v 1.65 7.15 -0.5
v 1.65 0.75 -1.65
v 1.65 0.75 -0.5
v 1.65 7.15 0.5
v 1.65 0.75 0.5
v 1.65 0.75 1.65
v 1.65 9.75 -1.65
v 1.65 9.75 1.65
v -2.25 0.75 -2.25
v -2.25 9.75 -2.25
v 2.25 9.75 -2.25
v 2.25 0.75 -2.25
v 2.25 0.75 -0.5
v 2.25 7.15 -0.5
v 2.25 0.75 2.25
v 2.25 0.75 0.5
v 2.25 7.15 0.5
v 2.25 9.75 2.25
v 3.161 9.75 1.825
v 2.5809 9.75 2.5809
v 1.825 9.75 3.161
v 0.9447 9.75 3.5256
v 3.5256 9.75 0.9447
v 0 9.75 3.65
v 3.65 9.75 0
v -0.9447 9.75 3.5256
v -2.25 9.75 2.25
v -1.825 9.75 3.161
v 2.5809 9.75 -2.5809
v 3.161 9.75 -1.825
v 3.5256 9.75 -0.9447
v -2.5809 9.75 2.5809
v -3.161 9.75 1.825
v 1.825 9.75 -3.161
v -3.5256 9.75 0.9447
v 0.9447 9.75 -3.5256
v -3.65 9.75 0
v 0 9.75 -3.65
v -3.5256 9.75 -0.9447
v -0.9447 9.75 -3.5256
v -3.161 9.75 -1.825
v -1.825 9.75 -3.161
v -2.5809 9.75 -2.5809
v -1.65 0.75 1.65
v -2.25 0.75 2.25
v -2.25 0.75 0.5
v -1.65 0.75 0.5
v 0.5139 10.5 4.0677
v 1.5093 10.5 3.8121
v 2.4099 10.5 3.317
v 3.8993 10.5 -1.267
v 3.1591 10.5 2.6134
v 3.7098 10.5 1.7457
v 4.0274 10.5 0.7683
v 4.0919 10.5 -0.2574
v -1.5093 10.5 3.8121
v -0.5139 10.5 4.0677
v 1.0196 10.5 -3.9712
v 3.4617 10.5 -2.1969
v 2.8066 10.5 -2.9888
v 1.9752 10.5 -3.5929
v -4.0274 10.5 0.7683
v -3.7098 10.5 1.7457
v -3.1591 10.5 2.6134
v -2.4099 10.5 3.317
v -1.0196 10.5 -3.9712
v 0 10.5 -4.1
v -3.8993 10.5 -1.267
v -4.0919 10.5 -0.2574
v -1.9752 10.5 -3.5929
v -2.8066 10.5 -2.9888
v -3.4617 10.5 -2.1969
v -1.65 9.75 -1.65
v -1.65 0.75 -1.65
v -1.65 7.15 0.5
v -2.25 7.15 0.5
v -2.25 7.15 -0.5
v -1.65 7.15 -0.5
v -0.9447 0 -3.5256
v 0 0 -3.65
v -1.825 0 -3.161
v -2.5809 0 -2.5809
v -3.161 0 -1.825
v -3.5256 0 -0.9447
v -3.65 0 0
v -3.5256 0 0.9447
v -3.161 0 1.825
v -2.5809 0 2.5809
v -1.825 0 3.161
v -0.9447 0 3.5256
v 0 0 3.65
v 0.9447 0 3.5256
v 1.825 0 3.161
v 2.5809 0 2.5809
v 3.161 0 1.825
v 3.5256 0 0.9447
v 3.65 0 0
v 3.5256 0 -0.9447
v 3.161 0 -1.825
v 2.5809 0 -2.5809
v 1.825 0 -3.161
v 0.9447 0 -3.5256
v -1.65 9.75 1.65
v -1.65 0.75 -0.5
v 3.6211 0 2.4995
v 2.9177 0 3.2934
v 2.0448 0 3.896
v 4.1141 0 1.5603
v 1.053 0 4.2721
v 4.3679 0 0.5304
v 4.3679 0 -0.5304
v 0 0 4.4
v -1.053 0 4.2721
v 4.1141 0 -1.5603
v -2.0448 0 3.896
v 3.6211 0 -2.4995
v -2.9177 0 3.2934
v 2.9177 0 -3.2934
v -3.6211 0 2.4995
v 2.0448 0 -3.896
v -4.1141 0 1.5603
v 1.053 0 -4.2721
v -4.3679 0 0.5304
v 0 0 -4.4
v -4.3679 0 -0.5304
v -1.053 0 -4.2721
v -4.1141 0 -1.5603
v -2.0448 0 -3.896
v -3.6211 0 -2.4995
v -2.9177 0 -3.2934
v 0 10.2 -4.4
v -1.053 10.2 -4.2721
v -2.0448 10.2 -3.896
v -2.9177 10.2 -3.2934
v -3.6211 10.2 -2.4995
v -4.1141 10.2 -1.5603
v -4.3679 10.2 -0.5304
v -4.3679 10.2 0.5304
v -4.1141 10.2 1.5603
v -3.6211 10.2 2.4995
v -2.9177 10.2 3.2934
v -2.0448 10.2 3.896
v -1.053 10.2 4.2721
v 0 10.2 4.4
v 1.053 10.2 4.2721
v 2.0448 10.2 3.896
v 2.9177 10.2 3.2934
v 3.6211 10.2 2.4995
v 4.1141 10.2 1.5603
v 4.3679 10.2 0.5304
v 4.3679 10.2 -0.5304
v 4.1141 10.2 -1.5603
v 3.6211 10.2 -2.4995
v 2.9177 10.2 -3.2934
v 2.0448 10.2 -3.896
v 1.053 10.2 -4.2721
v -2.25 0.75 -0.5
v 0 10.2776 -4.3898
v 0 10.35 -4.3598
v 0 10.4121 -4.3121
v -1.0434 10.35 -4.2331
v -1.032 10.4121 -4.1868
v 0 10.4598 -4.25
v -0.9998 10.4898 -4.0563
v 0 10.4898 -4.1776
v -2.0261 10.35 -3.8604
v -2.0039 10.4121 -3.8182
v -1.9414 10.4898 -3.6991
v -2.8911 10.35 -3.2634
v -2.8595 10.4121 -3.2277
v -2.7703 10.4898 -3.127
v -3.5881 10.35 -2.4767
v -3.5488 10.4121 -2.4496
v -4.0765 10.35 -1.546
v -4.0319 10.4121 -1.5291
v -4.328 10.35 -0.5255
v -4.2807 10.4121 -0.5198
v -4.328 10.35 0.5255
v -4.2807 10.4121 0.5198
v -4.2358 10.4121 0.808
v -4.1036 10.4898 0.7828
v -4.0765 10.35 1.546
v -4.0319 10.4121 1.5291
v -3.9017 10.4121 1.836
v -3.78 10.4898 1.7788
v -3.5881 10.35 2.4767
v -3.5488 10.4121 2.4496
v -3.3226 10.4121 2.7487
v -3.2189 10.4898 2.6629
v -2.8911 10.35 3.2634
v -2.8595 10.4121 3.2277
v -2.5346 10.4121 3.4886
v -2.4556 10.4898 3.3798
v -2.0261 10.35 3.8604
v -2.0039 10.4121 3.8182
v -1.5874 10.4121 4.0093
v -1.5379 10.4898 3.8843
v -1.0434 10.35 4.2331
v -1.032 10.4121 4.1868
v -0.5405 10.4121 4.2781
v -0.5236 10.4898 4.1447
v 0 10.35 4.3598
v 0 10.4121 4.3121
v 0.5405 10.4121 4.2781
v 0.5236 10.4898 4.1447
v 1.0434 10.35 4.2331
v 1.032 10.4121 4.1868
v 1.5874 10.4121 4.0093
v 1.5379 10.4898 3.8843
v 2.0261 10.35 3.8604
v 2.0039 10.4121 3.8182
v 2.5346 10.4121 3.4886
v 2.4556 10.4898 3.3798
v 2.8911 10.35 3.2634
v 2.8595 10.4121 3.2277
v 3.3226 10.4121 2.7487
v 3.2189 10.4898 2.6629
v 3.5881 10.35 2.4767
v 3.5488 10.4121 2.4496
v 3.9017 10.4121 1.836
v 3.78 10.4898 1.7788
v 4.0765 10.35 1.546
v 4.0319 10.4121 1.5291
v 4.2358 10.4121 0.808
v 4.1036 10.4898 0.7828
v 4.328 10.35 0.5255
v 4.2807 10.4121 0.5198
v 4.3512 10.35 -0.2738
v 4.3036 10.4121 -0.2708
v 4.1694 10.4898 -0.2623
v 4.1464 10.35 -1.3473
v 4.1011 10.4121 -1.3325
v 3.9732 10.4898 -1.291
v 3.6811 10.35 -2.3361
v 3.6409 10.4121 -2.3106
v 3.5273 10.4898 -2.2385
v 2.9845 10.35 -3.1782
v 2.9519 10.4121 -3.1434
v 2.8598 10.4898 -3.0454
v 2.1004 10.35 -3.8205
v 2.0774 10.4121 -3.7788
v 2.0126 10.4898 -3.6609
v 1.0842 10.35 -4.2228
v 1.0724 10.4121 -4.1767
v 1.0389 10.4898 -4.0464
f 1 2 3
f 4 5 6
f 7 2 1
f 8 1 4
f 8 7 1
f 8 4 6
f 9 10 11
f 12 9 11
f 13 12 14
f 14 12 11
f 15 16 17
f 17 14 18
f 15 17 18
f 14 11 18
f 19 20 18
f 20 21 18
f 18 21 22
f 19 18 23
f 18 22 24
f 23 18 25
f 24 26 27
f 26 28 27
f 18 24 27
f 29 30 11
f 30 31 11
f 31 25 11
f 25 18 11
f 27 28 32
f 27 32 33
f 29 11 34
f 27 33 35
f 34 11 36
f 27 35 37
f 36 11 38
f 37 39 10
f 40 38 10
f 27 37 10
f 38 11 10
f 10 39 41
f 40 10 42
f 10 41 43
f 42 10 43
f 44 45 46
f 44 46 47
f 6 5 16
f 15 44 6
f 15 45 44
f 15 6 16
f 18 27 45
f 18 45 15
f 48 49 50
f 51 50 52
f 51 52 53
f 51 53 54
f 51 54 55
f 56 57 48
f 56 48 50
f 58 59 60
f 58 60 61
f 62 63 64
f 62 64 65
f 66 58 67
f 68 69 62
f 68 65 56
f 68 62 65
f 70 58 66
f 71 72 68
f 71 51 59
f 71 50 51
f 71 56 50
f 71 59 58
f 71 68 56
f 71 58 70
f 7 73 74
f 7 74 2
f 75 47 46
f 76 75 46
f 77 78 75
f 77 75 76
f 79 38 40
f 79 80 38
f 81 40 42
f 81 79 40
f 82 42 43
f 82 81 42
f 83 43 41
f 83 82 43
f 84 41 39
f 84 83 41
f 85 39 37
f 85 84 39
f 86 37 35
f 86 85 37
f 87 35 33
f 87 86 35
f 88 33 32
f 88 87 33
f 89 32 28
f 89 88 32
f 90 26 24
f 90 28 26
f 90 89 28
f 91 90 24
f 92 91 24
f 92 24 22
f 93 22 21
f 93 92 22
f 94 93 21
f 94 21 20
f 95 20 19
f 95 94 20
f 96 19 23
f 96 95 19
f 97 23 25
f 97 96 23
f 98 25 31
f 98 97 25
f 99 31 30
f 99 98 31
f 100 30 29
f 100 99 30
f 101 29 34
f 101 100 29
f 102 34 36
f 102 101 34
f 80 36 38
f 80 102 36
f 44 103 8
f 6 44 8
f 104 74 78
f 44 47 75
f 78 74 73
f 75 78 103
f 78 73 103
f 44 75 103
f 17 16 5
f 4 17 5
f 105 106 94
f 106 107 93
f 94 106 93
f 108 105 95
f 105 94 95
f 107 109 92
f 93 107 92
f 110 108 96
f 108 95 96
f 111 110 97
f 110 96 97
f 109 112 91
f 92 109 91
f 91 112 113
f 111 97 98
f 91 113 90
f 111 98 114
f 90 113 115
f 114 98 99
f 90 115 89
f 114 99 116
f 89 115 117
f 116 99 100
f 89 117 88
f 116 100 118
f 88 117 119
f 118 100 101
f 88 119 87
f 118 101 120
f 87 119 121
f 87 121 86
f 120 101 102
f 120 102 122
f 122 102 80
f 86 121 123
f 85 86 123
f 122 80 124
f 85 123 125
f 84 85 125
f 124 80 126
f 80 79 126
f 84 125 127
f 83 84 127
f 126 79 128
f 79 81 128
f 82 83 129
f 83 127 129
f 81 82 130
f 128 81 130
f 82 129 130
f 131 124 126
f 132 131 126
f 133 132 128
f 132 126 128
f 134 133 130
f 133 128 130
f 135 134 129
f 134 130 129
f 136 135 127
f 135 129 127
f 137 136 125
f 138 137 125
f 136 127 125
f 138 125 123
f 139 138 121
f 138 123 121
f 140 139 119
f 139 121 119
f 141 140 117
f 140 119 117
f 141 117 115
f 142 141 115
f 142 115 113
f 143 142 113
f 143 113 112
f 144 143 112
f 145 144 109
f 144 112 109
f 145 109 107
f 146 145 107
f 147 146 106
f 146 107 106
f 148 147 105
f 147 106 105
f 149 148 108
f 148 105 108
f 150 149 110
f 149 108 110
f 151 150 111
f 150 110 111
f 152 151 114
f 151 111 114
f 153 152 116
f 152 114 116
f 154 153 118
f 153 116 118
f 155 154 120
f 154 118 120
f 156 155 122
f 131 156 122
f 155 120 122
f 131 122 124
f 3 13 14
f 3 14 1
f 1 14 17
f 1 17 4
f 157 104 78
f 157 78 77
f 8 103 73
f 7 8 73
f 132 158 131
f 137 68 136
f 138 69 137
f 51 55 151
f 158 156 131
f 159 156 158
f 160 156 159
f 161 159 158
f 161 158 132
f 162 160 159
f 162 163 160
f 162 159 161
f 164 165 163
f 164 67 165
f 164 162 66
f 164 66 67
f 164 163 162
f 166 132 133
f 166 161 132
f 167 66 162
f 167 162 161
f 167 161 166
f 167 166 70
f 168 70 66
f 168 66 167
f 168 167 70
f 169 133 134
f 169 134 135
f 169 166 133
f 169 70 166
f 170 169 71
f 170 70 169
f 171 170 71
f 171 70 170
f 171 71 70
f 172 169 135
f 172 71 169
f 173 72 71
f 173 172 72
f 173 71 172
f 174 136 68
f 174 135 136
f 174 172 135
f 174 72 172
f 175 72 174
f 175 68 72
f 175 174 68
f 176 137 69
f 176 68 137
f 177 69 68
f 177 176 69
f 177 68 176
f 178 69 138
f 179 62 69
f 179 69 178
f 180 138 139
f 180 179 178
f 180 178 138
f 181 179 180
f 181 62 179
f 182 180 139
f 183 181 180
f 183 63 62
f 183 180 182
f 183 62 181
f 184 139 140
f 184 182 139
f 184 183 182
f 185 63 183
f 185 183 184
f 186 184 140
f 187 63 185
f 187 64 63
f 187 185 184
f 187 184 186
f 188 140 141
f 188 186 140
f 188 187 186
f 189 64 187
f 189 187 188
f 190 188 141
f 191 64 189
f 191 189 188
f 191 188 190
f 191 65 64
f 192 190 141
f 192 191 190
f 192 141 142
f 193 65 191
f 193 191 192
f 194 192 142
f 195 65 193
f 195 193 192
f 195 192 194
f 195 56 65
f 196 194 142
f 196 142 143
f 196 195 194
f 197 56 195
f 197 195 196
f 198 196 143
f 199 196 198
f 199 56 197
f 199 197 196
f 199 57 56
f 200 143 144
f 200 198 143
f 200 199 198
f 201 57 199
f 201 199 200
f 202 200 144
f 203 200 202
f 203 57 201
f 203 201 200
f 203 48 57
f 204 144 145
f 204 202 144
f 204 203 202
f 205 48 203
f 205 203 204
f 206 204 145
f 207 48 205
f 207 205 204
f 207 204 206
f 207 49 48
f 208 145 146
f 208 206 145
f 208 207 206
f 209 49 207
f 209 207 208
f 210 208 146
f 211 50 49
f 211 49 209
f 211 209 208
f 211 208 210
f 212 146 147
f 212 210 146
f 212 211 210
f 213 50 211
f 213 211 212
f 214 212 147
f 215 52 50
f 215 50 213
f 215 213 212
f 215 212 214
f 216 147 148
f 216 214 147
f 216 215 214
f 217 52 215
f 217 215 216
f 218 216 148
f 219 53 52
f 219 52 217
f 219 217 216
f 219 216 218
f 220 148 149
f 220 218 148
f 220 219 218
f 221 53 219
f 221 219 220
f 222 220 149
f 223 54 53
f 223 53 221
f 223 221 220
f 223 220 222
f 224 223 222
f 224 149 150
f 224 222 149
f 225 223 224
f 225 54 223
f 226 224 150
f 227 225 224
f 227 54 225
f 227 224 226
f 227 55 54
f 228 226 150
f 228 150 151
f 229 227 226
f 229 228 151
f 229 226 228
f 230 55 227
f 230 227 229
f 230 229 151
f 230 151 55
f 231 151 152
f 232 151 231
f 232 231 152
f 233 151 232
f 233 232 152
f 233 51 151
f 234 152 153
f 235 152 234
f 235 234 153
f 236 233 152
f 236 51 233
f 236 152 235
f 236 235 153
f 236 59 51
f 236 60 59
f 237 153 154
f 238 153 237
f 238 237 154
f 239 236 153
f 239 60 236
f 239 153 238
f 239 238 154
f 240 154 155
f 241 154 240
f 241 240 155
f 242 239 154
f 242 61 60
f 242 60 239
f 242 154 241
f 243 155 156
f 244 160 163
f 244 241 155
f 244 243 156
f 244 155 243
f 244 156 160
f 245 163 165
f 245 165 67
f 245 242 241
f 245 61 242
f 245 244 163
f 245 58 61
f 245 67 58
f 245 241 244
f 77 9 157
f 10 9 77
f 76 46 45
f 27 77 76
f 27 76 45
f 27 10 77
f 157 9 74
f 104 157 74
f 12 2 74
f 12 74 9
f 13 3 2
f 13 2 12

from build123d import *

# Parameters (mm, degrees)
SKETCH1_R           = 4.4
BOSS_EXTRUDE1_DEPTH = 10.5
SHELL1_T            = -0.75
SKETCH3_W           = 4.5
SKETCH3_H           = 4.5
SKETCH3_W_2         = 3.3
SKETCH3_H_2         = 3.3
BOSS_EXTRUDE2_DEPTH = 9
SKETCH5_W           = 4.5
SKETCH5_H           = 1
CUT_EXTRUDE1_DEPTH  = 6.4
FILLET1_R           = 0.3


with BuildPart() as part:
    # Sketch1 → Boss-Extrude1 (new body)
    with BuildSketch(Plane(origin=(0, 0, 0), x_dir=(1, 0, 0), z_dir=(0, 1, 0))):
        with Locations(Location((0, 0, 0), (0, 0, 90))):
            Circle(SKETCH1_R)
    extrude(amount=BOSS_EXTRUDE1_DEPTH)

    # Shell1
    shell1_openings = [part.faces().sort_by_distance(p)[0] for p in [
        (0, 0, 0),
    ]]
    offset(amount=SHELL1_T, openings=shell1_openings, kind=Kind.INTERSECTION)

    # Sketch3 → Boss-Extrude2 (add)
    with BuildSketch(Plane.XZ.offset(-9.75)):
        Rectangle(SKETCH3_W, SKETCH3_H)
        Rectangle(SKETCH3_W_2, SKETCH3_H_2, mode=Mode.SUBTRACT)
    extrude(amount=BOSS_EXTRUDE2_DEPTH)

    # Sketch5 → Cut-Extrude1 (cut)
    with BuildSketch(Plane(origin=(0, 0.75, 0), x_dir=(-1, 0, 0), z_dir=(0, -1, 0))):
        Rectangle(SKETCH5_W, SKETCH5_H)
    extrude(amount=-CUT_EXTRUDE1_DEPTH, mode=Mode.SUBTRACT)

    # Fillet1
    fillet1_edges = [part.edges().sort_by_distance(p)[0] for p in [
        (0, 10.5, 4.4),
    ]]
    fillet(fillet1_edges, radius=FILLET1_R)


solid = part.part
